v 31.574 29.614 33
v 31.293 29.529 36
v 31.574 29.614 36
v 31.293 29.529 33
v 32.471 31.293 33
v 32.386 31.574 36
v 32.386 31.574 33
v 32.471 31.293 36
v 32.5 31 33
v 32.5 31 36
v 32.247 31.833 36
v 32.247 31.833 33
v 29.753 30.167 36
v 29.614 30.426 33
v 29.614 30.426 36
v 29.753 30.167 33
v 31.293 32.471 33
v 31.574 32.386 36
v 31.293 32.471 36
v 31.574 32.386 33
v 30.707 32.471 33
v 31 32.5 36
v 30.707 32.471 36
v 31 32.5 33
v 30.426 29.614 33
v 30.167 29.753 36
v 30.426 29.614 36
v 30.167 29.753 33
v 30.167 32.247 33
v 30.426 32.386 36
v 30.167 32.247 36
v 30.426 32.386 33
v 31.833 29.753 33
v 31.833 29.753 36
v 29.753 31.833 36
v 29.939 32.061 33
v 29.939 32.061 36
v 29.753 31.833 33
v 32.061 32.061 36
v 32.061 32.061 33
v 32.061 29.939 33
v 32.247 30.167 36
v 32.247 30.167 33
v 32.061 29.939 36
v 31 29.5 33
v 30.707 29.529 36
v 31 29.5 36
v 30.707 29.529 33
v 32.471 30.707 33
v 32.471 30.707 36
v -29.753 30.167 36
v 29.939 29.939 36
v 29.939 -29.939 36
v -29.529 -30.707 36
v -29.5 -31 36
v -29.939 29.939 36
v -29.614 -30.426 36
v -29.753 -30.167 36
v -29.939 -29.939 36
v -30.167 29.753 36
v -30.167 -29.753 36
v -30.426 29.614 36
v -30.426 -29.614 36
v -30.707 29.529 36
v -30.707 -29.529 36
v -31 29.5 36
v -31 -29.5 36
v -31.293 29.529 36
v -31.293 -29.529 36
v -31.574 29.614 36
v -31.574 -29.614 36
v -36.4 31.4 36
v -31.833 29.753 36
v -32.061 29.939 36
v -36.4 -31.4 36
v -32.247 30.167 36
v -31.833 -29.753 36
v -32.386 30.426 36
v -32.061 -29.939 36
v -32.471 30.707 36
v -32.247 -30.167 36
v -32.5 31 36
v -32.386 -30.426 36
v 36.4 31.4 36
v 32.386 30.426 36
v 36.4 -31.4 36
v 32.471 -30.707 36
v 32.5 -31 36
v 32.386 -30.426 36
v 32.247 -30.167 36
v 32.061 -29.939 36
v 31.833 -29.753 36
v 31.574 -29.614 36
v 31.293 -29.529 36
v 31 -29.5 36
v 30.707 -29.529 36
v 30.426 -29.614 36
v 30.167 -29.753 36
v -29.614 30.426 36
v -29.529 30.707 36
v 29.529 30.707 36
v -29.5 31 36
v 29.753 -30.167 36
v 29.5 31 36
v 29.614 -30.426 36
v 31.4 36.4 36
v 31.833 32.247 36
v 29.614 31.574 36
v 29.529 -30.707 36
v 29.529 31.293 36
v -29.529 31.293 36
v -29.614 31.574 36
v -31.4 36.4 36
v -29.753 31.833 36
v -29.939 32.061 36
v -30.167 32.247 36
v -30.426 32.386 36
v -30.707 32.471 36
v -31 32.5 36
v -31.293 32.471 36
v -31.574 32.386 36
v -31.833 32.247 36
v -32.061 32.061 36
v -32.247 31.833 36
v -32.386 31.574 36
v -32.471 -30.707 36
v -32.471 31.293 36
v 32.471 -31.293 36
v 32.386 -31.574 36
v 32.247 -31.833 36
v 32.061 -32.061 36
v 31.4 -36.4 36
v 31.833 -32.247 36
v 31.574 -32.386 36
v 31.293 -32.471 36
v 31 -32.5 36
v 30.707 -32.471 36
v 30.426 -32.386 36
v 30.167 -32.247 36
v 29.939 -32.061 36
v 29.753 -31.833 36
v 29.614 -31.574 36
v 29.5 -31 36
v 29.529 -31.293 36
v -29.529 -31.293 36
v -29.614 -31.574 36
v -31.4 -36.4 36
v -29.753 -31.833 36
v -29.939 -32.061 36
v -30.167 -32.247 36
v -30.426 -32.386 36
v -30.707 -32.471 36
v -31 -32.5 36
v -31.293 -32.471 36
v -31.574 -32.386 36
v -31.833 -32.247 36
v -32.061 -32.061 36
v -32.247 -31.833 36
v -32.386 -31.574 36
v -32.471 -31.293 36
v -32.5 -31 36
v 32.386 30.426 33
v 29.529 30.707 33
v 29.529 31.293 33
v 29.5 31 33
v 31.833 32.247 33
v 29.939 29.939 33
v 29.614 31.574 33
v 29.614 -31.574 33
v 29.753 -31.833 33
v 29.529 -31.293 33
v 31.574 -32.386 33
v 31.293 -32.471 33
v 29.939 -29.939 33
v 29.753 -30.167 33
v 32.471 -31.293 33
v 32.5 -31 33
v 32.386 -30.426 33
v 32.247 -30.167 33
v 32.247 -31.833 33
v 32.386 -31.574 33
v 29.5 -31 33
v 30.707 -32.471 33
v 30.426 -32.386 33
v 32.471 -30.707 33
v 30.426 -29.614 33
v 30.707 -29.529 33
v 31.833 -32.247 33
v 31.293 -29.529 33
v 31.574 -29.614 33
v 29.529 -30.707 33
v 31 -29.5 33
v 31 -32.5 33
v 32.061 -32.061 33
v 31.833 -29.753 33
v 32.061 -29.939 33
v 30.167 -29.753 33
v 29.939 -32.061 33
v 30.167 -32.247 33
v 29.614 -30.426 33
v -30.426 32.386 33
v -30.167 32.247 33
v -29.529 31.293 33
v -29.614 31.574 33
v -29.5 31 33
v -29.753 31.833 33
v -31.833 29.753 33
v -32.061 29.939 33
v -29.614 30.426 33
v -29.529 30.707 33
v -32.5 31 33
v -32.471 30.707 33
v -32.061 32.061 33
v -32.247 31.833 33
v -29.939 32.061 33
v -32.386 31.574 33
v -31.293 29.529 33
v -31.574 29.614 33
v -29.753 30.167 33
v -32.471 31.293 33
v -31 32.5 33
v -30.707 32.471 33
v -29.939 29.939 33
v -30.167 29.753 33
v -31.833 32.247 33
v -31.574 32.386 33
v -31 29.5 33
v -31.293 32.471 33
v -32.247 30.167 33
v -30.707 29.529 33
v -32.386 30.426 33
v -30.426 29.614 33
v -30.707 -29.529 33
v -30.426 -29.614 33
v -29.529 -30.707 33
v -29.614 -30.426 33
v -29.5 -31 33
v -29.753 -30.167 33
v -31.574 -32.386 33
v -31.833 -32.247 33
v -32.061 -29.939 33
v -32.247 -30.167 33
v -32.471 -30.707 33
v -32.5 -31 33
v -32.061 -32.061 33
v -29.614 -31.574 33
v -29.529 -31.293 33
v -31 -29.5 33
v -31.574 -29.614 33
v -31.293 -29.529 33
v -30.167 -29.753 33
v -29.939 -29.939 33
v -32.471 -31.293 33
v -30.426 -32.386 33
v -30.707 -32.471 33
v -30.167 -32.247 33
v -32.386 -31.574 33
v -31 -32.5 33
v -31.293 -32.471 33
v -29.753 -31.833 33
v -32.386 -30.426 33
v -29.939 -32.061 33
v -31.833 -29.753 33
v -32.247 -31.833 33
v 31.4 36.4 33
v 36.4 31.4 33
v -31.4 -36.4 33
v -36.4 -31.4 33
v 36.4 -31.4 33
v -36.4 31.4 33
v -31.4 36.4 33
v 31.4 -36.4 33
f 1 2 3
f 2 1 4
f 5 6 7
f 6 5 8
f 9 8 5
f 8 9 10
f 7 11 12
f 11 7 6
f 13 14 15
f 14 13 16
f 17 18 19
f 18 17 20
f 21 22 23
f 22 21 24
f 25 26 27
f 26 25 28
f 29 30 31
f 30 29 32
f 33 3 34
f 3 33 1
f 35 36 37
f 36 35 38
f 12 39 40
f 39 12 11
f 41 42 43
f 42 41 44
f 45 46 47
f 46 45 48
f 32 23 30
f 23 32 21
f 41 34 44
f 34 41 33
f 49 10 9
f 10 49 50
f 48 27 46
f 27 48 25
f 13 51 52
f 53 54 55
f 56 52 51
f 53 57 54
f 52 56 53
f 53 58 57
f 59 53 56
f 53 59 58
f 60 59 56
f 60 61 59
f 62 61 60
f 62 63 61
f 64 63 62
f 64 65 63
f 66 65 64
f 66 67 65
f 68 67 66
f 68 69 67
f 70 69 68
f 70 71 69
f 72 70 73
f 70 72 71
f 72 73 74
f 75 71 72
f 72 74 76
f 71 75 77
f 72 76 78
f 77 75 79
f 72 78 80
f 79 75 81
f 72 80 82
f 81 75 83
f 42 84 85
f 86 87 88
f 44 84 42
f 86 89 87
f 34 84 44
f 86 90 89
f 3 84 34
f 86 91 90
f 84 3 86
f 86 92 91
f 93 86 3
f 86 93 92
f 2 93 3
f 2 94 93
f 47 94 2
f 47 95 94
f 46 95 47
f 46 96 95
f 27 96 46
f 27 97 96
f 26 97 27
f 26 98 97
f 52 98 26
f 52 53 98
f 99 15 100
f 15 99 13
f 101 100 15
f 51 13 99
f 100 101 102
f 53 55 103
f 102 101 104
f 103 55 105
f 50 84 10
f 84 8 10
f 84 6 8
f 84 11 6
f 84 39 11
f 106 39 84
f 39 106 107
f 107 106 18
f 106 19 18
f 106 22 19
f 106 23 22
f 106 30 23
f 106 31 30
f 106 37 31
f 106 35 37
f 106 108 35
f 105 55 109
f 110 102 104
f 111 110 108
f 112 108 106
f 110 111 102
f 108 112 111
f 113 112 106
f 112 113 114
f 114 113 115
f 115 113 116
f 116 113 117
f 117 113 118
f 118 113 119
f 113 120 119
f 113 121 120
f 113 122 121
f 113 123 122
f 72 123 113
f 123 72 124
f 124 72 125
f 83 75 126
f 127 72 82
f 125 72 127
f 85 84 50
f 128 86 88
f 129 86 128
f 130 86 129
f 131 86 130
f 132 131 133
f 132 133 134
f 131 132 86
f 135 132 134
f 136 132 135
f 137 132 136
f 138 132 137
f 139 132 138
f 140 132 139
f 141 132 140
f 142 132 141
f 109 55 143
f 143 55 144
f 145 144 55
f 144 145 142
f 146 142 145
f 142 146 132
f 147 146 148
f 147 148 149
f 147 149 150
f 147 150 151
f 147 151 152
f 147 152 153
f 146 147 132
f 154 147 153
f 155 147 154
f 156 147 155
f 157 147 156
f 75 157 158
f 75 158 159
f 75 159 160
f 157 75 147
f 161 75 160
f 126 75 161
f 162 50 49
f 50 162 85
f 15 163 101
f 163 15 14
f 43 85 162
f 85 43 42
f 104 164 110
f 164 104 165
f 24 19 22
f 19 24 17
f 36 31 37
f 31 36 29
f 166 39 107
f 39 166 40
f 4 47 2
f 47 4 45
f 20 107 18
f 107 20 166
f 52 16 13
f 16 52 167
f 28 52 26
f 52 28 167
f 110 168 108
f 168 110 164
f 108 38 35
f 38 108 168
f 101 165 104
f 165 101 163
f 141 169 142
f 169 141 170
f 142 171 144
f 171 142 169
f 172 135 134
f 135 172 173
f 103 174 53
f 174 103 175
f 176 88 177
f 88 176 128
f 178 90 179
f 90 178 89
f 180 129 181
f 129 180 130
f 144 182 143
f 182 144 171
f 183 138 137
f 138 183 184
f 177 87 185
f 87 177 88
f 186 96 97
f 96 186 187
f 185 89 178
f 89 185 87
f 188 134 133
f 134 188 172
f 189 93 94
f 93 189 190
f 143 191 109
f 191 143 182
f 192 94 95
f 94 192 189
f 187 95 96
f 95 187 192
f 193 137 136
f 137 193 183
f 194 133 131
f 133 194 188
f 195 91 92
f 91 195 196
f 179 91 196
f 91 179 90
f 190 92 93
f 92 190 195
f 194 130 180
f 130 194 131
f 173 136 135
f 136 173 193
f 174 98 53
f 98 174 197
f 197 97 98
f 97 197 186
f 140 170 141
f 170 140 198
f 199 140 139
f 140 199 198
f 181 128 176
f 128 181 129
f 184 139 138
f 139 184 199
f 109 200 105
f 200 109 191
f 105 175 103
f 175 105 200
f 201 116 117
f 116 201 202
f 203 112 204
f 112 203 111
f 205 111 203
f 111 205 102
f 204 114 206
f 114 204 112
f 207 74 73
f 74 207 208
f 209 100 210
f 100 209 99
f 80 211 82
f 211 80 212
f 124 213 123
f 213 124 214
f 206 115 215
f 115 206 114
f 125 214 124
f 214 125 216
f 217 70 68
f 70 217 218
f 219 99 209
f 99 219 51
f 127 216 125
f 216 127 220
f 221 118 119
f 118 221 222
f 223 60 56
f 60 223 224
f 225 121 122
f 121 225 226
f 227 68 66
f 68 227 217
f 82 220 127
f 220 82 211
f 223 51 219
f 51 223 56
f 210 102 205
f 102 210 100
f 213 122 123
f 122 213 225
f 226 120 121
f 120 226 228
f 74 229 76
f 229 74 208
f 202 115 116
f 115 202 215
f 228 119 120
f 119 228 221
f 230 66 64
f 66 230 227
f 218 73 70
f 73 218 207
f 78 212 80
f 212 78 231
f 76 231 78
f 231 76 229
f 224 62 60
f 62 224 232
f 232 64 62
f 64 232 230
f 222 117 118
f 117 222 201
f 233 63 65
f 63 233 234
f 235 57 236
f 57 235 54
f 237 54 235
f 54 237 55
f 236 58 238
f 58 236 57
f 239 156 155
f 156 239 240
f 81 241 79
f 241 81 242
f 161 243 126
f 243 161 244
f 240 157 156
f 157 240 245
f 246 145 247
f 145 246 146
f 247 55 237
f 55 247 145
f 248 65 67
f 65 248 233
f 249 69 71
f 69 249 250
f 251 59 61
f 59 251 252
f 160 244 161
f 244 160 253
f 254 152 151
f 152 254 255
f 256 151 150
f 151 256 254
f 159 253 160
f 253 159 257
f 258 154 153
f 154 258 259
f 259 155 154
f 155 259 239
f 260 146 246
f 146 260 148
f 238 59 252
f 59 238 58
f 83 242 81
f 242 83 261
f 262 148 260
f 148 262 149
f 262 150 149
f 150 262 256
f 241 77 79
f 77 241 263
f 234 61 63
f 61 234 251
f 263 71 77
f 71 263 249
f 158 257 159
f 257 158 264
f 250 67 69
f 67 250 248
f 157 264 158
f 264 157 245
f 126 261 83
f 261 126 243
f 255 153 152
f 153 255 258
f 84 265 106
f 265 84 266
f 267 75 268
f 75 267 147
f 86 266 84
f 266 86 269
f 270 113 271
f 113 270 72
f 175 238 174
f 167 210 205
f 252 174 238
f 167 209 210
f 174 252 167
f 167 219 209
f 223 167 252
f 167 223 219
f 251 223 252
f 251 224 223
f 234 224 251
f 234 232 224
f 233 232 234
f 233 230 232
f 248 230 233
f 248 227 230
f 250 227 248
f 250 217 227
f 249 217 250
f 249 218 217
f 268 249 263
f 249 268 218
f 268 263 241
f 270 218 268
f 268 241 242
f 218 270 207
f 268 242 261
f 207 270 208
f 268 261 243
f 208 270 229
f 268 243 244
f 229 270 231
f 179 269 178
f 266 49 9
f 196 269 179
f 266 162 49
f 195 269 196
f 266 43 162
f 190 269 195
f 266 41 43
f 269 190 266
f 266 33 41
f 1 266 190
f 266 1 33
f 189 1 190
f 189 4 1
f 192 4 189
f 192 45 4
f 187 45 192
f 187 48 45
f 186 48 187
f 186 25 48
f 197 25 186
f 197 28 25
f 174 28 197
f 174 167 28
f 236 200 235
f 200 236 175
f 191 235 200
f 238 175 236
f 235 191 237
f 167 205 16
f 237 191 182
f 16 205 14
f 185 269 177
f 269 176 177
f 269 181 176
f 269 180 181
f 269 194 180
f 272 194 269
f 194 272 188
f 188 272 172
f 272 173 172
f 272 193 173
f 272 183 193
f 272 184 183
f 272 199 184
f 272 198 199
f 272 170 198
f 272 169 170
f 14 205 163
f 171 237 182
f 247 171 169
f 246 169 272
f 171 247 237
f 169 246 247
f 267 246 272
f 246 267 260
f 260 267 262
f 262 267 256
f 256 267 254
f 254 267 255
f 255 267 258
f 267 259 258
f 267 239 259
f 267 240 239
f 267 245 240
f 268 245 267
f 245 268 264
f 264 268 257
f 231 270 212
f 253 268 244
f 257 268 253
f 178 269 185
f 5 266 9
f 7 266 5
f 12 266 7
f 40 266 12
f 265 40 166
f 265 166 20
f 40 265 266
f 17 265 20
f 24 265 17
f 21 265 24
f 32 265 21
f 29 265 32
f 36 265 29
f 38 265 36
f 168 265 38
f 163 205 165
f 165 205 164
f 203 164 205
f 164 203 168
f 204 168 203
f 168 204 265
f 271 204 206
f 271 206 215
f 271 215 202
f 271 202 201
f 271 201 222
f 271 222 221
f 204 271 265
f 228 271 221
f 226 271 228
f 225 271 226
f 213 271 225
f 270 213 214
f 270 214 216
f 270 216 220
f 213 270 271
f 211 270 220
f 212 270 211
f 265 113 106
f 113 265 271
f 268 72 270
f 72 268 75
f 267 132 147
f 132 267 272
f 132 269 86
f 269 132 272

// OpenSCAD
enclosure_inner_length = 70;
enclosure_inner_width = 70;
enclosure_inner_depth = 30;

enclosure_thickness = 3;

cover_thickness = 3;

part = "cover"; // [enclosure:Enclosure, cover:Cover, both:Enclosure and Cover]

print_part();

module print_part() {
	if (part == "enclosure") {
		box2(enclosure_inner_length,enclosure_inner_width,enclosure_inner_depth,enclosure_thickness,enclosure_thickness/2-0.10,cover_thickness);
	} else if (part == "cover") {
		lid2(enclosure_inner_length,enclosure_inner_width,enclosure_inner_depth,enclosure_thickness,enclosure_thickness/2+0.10,cover_thickness);
	} else {
		both();
	}
}

module both() {

box2(enclosure_inner_length,enclosure_inner_width,enclosure_inner_depth,enclosure_thickness,enclosure_thickness/2-0.10,cover_thickness);
lid2(enclosure_inner_length,enclosure_inner_width,enclosure_inner_depth,enclosure_thickness,enclosure_thickness/2+0.10,cover_thickness);

}

module screws(in_x, in_y, in_z, shell) {

	sx = in_x/2 - 4;
	sy = in_y/2 - 4;
	sh = shell + in_z - 12;
	nh = shell + in_z - 4;

translate([0,0,0]) {
	translate([sx , sy, sh]) cylinder(r=1.5, h = 15, $fn=32);
	translate([sx , -sy, sh ]) cylinder(r=1.5, h = 15, $fn=32);
	translate([-sx , sy, sh ]) cylinder(r=1.5, h = 15, $fn=32);
	translate([-sx , -sy, sh ]) cylinder(r=1.5, h = 15, $fn=32);


	translate([-sx , -sy, nh ]) rotate([0,0,-45])
		translate([-5.75/2, -5.6/2, -0.7]) cube ([5.75, 10, 2.8]);
	translate([sx , -sy, nh ]) rotate([0,0,45])
		translate([-5.75/2, -5.6/2, -0.7]) cube ([5.75, 10, 2.8]);
	translate([sx , sy, nh ]) rotate([0,0,90+45])
		translate([-5.75/2, -5.6/2, -0.7]) cube ([5.75, 10, 2.8]);
	translate([-sx , sy, nh ]) rotate([0,0,-90-45])
		translate([-5.75/2, -5.6/2, -0.7]) cube ([5.75, 10, 2.8]);
}
}

module bottom(in_x, in_y, in_z, shell) {

	hull() {
   	 	translate([-in_x/2+shell, -in_y/2+shell, 0]) cylinder(r=shell*2,h=shell, $fn=32);
		translate([+in_x/2-shell, -in_y/2+shell, 0]) cylinder(r=shell*2,h=shell, $fn=32);
		translate([+in_x/2-shell, in_y/2-shell, 0]) cylinder(r=shell*2,h=shell, $fn=32);
		translate([-in_x/2+shell, in_y/2-shell, 0]) cylinder(r=shell*2,h=shell, $fn=32);
	}
}

module sides(in_x, in_y, in_z, shell) {
translate([0,0,shell])
difference() {

	hull() {
   	 	translate([-in_x/2+shell, -in_y/2+shell, 0]) cylinder(r=shell*2,h=in_z, $fn=32);
		translate([+in_x/2-shell, -in_y/2+shell, 0]) cylinder(r=shell*2,h=in_z, $fn=32);
		translate([+in_x/2-shell, in_y/2-shell, 0]) cylinder(r=shell*2,h=in_z, $fn=32);
		translate([-in_x/2+shell, in_y/2-shell, 0]) cylinder(r=shell*2,h=in_z, $fn=32);
	}

	hull() {
   	 	translate([-in_x/2+shell, -in_y/2+shell, 0]) cylinder(r=shell,h=in_z+1, $fn=32);
		translate([+in_x/2-shell, -in_y/2+shell, 0]) cylinder(r=shell,h=in_z+1, $fn=32);
		translate([+in_x/2-shell, in_y/2-shell, 0]) cylinder(r=shell,h=in_z+1, $fn=32);
		translate([-in_x/2+shell, in_y/2-shell, 0]) cylinder(r=shell,h=in_z+1, $fn=32);
	}
}

intersection() {
	translate([-in_x/2, -in_y/2, shell]) cube([in_x, in_y, in_z+2]);

	union() {
	translate([-in_x/2 , -in_y/2,shell + in_z -6]) cylinder(r=9, h = 6, $fn=64);
	translate([-in_x/2 , -in_y/2,shell + in_z -10]) cylinder(r1=3, r2=9, h = 4, $fn=64);

	translate([in_x/2 , -in_y/2, shell + in_z -6]) cylinder(r=9, h = 6, $fn=64);
	translate([in_x/2 , -in_y/2, shell + in_z -10]) cylinder(r1=3, r2=9, h = 4, $fn=64);

	translate([in_x/2 , in_y/2,  shell + in_z -6]) cylinder(r=9, h = 6, $fn=64);
	translate([in_x/2 , in_y/2,  shell + in_z -10]) cylinder(r1=3, r2=9, h = 4, $fn=64);

	translate([-in_x/2 , in_y/2, shell + in_z -6]) cylinder(r=9, h = 6, $fn=64);
	translate([-in_x/2 , in_y/2, shell + in_z -10]) cylinder(r1=3, r2=9, h = 4, $fn=64);
	}

}
}

module lid_top_lip2(in_x, in_y, in_z, shell, top_lip, top_thickness) {

	cxm = -in_x/2 - (shell-top_lip);
	cxp = in_x/2 + (shell-top_lip);
	cym = -in_y/2 - (shell-top_lip);
	cyp = in_y/2 + (shell-top_lip);

	translate([0,0,shell+in_z])

difference() {

	hull() {
   	 	translate([-in_x/2+shell, -in_y/2+shell, 0]) cylinder(r=shell*2,h=top_thickness, $fn=32);
		translate([+in_x/2-shell, -in_y/2+shell, 0]) cylinder(r=shell*2,h=top_thickness, $fn=32);
		translate([+in_x/2-shell, in_y/2-shell, 0]) cylinder(r=shell*2,h=top_thickness, $fn=32);
		translate([-in_x/2+shell, in_y/2-shell, 0]) cylinder(r=shell*2,h=top_thickness, $fn=32);
	}


	translate([0, 0, -1]) linear_extrude(height = top_thickness + 2) polygon(points = [
		[cxm+5, cym],
		[cxm, cym+5],
		[cxm, cyp-5],
		[cxm+5, cyp],
		[cxp-5, cyp],
		[cxp, cyp-5],
		[cxp, cym+5],
		[cxp-5, cym]]);
}
}

module lid2(in_x, in_y, in_z, shell, top_lip, top_thickness) {

	cxm = -in_x/2 - (shell-top_lip);
	cxp = in_x/2 + (shell-top_lip);
	cym = -in_y/2 - (shell-top_lip);
	cyp = in_y/2 + (shell-top_lip);

difference() {
	translate([0, 0, in_z+shell]) linear_extrude(height = top_thickness ) polygon(points = [
		[cxm+5, cym],
		[cxm, cym+5],
		[cxm, cyp-5],
		[cxm+5, cyp],
		[cxp-5, cyp],
		[cxp, cyp-5],
		[cxp, cym+5],
		[cxp-5, cym]]);


		screws(in_x, in_y, in_z, shell);


}
}

module box2(in_x, in_y, in_z, shell, top_lip, top_thickness) {
	bottom(in_x, in_y, in_z, shell);
	difference() {
		sides(in_x, in_y, in_z, shell);
		screws(in_x, in_y, in_z, shell);
	}
	lid_top_lip2(in_x, in_y, in_z, shell, top_lip, top_thickness);
}
